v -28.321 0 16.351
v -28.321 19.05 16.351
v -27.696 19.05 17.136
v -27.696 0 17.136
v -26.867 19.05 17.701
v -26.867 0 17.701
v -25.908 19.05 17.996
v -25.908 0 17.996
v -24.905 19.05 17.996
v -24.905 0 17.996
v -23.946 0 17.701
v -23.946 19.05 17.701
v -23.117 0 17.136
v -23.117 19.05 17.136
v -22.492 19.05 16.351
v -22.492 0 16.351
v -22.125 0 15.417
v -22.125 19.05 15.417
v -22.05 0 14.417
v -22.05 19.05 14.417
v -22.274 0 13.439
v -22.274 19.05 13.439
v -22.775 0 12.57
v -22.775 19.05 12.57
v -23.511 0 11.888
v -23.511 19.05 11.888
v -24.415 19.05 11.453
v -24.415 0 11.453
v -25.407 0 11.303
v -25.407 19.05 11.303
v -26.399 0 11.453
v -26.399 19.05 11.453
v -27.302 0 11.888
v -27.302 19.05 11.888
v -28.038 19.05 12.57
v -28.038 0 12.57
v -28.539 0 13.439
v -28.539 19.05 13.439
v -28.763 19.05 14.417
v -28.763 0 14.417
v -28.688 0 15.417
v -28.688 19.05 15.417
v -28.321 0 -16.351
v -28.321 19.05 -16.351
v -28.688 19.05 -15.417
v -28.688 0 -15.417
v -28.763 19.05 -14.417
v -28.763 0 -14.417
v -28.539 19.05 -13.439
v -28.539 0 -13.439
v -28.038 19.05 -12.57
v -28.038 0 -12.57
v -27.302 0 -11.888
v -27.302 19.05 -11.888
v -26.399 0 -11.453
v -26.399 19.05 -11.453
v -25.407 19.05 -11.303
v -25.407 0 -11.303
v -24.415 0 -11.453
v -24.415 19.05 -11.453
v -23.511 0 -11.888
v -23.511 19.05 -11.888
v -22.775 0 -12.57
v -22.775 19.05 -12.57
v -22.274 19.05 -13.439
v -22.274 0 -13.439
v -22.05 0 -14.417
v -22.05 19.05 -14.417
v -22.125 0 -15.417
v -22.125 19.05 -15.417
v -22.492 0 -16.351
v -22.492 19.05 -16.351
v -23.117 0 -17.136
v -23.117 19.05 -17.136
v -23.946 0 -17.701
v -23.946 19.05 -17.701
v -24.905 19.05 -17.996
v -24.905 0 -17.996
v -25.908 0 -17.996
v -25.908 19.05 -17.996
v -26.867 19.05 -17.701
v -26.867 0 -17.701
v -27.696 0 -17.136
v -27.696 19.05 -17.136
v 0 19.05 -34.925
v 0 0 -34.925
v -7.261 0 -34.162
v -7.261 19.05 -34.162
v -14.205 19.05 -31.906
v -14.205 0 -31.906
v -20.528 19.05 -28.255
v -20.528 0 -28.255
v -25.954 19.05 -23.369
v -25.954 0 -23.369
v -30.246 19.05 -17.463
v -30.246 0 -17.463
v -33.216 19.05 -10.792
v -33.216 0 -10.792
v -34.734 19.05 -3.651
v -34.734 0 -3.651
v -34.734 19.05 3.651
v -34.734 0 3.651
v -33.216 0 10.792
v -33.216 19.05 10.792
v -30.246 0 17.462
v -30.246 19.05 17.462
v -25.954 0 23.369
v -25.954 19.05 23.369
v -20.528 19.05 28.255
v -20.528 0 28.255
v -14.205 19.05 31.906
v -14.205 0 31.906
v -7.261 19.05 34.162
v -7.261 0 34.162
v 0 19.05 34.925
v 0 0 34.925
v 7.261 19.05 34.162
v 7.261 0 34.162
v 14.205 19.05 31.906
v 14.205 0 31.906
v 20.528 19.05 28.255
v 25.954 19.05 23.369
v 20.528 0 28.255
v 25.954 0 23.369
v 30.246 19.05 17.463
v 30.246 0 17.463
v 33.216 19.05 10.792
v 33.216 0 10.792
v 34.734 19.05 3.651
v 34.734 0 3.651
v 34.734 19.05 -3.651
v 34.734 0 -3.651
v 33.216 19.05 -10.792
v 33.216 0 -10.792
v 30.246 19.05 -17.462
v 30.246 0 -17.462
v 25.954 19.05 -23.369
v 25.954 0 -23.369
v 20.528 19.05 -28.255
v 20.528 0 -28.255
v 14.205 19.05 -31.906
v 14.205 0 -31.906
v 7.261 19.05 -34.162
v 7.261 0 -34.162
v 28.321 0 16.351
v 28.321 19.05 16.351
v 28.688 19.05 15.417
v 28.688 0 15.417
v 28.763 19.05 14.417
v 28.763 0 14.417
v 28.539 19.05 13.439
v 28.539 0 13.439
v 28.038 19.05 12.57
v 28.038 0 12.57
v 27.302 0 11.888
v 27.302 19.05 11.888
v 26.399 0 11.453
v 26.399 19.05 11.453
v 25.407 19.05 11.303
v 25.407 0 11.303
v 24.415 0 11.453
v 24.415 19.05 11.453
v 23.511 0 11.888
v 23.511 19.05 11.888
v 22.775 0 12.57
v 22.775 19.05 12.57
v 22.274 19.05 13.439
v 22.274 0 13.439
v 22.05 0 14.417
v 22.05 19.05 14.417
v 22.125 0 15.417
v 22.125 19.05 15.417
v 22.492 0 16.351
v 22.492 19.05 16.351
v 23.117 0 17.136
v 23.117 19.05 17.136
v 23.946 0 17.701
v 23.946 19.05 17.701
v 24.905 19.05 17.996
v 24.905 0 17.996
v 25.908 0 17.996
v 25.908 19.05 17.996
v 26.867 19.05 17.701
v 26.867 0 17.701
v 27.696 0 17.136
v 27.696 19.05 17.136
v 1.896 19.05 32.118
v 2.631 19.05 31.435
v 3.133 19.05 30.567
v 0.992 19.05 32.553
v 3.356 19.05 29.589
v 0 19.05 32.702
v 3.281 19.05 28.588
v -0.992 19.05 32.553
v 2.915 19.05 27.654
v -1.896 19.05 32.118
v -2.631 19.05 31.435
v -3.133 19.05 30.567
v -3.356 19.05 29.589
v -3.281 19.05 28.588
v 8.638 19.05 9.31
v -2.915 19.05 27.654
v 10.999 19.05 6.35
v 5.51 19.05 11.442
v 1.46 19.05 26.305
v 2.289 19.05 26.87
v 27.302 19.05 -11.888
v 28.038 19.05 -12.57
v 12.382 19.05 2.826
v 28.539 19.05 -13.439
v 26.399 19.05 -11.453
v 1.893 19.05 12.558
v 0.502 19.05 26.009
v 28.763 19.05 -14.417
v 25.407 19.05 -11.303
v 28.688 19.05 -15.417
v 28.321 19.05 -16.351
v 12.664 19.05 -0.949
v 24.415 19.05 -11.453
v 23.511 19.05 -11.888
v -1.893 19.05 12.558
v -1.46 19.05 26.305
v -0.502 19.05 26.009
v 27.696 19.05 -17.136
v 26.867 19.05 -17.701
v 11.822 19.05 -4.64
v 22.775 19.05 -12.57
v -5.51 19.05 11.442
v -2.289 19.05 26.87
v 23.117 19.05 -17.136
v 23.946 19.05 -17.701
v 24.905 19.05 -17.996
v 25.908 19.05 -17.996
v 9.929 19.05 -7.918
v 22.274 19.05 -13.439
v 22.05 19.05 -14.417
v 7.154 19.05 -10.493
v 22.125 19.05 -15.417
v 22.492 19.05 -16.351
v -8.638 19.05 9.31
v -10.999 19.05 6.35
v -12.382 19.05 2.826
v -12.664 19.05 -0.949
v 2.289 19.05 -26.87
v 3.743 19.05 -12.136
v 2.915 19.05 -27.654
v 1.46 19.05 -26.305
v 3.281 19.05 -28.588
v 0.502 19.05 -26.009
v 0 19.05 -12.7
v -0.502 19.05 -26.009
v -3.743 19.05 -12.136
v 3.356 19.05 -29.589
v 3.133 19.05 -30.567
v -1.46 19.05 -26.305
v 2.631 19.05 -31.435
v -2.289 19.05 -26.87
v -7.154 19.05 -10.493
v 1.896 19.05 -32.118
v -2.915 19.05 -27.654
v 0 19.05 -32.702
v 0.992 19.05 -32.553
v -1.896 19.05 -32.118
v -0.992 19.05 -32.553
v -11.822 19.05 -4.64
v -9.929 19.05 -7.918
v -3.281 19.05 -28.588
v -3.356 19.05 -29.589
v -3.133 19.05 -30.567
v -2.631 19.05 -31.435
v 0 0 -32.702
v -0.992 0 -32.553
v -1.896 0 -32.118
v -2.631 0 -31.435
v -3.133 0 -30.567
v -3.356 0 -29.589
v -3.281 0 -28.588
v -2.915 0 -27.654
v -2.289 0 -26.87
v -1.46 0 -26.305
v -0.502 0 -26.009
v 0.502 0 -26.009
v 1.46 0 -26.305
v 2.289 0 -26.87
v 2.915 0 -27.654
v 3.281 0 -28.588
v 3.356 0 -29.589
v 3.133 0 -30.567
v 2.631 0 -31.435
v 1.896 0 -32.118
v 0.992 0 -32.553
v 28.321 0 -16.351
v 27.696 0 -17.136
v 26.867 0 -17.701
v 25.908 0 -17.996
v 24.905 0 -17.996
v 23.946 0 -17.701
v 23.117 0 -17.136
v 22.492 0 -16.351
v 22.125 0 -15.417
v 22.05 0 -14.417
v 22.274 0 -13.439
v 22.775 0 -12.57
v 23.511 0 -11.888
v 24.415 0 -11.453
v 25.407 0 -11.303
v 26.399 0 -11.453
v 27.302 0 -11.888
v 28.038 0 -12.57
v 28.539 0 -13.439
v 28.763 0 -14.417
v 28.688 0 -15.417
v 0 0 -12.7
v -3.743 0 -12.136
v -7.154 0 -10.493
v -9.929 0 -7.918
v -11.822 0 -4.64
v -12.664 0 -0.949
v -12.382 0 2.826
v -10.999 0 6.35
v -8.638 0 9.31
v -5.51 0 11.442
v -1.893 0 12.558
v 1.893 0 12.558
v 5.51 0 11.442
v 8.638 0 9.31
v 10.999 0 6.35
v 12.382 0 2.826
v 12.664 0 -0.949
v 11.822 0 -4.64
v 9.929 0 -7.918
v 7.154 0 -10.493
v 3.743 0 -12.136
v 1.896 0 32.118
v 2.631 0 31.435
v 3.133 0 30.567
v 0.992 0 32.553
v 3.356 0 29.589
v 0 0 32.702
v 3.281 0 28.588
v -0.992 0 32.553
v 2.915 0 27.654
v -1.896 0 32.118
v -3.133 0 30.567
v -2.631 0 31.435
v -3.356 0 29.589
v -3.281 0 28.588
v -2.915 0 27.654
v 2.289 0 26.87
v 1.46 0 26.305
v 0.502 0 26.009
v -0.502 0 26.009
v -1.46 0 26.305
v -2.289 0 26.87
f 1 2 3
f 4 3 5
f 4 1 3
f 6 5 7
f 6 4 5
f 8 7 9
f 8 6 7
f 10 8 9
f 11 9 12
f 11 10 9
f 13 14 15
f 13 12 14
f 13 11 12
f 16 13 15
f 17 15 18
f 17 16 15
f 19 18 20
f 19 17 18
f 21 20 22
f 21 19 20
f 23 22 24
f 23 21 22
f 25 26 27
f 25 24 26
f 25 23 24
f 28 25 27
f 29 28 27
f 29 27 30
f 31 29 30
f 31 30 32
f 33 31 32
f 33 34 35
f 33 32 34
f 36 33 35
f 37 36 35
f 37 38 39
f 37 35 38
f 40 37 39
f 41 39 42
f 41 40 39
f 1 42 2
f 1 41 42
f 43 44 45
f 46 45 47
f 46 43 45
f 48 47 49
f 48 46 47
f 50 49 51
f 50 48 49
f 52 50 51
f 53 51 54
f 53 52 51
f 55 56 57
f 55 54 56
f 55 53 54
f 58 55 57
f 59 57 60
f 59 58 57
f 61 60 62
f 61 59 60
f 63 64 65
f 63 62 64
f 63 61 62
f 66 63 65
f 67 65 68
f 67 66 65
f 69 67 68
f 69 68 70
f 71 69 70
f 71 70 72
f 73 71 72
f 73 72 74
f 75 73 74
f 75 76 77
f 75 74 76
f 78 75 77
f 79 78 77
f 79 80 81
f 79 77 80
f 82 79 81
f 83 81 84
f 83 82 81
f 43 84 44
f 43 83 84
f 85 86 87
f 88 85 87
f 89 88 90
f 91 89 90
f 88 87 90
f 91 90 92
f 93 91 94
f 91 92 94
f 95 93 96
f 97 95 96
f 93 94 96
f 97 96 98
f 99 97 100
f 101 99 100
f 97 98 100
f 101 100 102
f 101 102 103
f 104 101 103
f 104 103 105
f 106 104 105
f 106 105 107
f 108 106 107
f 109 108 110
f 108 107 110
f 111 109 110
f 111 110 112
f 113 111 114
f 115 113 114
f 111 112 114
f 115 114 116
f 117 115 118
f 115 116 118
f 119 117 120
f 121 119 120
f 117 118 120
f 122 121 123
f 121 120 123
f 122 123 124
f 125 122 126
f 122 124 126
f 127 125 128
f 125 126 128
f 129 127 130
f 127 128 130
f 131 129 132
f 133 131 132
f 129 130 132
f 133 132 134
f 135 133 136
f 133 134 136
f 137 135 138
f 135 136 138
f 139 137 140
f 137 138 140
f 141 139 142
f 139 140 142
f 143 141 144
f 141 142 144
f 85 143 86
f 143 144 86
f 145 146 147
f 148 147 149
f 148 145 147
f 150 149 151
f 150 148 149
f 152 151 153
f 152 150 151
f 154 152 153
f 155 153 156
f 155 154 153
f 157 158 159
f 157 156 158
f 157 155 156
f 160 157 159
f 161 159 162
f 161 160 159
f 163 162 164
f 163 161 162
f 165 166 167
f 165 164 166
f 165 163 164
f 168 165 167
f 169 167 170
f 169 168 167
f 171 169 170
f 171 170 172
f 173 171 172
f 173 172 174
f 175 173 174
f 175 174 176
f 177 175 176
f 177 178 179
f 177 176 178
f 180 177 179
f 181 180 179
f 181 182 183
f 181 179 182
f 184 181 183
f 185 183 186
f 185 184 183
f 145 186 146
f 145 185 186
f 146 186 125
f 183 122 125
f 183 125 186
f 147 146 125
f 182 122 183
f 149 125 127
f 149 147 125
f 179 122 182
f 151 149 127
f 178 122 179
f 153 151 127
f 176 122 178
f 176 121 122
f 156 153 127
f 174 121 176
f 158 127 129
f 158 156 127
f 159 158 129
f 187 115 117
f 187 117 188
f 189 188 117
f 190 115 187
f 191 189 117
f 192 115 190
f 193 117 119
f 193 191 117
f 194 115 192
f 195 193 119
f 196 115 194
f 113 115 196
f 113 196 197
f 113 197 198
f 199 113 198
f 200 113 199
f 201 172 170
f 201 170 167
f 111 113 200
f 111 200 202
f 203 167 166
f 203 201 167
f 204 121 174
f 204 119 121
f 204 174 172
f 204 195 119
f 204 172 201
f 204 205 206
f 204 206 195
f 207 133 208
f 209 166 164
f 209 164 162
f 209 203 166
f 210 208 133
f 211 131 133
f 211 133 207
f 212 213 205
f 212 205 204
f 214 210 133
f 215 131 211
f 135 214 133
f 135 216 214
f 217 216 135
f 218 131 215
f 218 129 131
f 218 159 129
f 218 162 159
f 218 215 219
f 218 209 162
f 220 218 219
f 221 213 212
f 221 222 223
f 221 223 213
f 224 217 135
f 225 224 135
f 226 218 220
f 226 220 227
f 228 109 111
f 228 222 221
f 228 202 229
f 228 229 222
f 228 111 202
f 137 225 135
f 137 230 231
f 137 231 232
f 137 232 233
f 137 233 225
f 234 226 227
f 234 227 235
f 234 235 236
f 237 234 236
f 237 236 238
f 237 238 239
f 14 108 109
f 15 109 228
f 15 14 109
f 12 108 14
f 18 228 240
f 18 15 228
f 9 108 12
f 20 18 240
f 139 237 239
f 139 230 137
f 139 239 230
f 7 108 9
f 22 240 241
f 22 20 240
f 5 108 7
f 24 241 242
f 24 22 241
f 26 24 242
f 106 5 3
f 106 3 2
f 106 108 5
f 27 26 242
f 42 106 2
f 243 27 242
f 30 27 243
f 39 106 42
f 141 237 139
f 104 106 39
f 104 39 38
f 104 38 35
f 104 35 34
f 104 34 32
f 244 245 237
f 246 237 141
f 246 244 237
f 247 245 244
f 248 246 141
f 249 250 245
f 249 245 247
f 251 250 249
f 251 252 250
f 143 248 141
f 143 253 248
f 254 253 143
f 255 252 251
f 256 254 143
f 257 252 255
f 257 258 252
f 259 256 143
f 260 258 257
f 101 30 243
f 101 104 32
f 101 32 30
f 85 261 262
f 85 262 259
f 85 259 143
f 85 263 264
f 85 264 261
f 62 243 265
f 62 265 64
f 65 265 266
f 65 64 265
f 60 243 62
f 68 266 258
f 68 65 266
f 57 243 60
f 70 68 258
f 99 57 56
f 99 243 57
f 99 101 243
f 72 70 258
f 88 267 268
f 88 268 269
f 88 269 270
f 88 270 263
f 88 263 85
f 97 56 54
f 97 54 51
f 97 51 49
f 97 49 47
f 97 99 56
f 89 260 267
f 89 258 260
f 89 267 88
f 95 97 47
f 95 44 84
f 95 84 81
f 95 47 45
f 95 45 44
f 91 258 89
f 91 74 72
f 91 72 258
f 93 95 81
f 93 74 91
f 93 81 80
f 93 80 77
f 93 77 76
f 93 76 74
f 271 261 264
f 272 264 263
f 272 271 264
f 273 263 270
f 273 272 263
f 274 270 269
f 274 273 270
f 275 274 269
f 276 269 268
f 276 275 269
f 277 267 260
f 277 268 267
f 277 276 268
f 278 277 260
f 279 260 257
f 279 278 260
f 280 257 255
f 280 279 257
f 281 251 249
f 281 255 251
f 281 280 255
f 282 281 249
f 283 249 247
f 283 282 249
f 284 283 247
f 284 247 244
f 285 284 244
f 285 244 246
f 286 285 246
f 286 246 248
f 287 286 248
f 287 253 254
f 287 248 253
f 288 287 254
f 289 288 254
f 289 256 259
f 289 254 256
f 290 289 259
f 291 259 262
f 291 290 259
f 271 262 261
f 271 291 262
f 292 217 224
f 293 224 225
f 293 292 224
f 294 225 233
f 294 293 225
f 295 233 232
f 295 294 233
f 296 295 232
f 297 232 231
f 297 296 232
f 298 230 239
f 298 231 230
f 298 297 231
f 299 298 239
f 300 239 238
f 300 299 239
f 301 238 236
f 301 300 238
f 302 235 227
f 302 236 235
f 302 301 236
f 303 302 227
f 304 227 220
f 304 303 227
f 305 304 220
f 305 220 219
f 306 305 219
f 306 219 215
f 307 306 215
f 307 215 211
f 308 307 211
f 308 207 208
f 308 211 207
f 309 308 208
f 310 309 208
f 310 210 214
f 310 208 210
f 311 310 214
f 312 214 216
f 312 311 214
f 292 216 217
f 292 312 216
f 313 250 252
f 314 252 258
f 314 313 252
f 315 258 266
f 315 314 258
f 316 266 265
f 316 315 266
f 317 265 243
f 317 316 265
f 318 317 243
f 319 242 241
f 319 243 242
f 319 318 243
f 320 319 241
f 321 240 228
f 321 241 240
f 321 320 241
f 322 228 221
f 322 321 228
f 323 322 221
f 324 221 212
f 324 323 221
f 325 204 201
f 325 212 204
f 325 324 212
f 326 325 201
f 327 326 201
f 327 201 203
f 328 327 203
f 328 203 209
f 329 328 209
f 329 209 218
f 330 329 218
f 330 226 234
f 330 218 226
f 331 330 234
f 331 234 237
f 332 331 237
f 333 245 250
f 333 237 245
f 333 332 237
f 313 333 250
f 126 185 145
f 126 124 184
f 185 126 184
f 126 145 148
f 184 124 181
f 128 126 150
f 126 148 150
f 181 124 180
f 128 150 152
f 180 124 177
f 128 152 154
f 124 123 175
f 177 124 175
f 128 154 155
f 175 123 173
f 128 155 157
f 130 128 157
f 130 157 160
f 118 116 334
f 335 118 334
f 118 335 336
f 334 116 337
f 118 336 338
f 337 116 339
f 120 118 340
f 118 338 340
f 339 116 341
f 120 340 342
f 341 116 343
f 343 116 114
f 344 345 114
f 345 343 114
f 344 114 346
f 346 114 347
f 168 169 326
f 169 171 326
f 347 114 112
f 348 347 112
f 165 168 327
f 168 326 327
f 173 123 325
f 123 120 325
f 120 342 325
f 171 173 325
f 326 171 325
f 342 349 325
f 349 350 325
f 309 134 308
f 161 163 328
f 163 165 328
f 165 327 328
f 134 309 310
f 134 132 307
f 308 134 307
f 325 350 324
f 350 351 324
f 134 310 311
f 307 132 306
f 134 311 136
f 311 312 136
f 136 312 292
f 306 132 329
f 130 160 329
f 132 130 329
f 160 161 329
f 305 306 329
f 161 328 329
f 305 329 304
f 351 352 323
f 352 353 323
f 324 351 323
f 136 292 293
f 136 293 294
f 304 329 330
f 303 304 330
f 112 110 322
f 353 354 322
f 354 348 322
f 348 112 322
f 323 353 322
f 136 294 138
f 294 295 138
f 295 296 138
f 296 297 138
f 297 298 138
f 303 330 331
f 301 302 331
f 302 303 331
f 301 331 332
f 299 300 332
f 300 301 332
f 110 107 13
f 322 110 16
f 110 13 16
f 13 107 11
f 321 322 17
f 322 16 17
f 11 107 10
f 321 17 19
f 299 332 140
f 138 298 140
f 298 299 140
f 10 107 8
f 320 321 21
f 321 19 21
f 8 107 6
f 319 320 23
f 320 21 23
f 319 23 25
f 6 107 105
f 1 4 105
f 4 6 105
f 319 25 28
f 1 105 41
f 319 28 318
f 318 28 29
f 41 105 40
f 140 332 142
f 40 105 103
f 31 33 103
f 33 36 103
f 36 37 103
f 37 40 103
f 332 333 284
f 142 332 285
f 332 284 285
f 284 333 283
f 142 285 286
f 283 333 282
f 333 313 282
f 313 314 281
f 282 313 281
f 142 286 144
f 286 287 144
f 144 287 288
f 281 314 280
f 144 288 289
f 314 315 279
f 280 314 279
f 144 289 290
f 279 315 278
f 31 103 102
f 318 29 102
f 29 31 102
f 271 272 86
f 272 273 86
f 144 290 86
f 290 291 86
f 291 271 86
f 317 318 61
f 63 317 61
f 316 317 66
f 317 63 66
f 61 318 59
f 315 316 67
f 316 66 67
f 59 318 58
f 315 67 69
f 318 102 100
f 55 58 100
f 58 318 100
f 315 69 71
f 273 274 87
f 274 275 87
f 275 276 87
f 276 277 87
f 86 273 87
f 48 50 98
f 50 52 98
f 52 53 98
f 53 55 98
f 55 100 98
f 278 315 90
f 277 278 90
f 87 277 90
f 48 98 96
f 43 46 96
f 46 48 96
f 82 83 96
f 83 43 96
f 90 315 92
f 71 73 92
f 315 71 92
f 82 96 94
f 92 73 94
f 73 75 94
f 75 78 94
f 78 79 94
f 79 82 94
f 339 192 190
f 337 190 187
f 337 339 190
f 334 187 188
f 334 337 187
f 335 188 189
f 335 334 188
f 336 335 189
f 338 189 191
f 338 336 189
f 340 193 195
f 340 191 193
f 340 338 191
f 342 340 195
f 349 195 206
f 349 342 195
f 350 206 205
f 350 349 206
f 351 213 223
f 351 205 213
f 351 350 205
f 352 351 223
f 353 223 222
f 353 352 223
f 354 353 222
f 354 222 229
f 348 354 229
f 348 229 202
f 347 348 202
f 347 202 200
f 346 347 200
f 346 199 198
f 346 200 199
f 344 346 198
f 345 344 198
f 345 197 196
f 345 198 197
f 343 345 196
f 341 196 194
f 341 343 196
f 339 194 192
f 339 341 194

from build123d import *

# Parameters (mm, degrees)
SKETCH1_R          = 34.925
EXTRUDE1_DEPTH     = 19.05
SKETCH2_R          = 12.7
CUT_EXTRUDE1_DEPTH = 53.937829102
SKETCH3_R          = 3.3655
CUT_EXTRUDE2_DEPTH = 53.937829102
CIRPATTERN1_COUNT  = 6


with BuildPart() as part:
    # Sketch1 → Extrude1 (new body)
    with BuildSketch(Plane(origin=(0, 0, 0), x_dir=(1, 0, 0), z_dir=(0, 1, 0))):
        Circle(SKETCH1_R)
    extrude(amount=EXTRUDE1_DEPTH)

    # Sketch2 → Cut-Extrude1 (cut, through all)
    with BuildSketch(Plane(origin=(0, 0, 0), x_dir=(1, 0, 0), z_dir=(0, 1, 0))):
        Circle(SKETCH2_R)
    extrude(amount=CUT_EXTRUDE1_DEPTH, mode=Mode.SUBTRACT)

    # Sketch3 → Cut-Extrude2 (cut, through all)
    with BuildSketch(Plane(origin=(0, 0, 0), x_dir=(1, 0, 0), z_dir=(0, 1, 0))):
        with Locations((0, 29.337)):
            Circle(SKETCH3_R)
    cut_extrude2 = extrude(amount=CUT_EXTRUDE2_DEPTH, mode=Mode.SUBTRACT)

    # CirPattern1: Cut-Extrude2 ×6 about axis
    cirpattern1_axis = Axis((0, 35.858162691, 0), (0, -1, 0))
    for i in range(1, CIRPATTERN1_COUNT):
        add(cut_extrude2.rotate(cirpattern1_axis, i * 360 / CIRPATTERN1_COUNT), mode=Mode.SUBTRACT)


solid = part.part
